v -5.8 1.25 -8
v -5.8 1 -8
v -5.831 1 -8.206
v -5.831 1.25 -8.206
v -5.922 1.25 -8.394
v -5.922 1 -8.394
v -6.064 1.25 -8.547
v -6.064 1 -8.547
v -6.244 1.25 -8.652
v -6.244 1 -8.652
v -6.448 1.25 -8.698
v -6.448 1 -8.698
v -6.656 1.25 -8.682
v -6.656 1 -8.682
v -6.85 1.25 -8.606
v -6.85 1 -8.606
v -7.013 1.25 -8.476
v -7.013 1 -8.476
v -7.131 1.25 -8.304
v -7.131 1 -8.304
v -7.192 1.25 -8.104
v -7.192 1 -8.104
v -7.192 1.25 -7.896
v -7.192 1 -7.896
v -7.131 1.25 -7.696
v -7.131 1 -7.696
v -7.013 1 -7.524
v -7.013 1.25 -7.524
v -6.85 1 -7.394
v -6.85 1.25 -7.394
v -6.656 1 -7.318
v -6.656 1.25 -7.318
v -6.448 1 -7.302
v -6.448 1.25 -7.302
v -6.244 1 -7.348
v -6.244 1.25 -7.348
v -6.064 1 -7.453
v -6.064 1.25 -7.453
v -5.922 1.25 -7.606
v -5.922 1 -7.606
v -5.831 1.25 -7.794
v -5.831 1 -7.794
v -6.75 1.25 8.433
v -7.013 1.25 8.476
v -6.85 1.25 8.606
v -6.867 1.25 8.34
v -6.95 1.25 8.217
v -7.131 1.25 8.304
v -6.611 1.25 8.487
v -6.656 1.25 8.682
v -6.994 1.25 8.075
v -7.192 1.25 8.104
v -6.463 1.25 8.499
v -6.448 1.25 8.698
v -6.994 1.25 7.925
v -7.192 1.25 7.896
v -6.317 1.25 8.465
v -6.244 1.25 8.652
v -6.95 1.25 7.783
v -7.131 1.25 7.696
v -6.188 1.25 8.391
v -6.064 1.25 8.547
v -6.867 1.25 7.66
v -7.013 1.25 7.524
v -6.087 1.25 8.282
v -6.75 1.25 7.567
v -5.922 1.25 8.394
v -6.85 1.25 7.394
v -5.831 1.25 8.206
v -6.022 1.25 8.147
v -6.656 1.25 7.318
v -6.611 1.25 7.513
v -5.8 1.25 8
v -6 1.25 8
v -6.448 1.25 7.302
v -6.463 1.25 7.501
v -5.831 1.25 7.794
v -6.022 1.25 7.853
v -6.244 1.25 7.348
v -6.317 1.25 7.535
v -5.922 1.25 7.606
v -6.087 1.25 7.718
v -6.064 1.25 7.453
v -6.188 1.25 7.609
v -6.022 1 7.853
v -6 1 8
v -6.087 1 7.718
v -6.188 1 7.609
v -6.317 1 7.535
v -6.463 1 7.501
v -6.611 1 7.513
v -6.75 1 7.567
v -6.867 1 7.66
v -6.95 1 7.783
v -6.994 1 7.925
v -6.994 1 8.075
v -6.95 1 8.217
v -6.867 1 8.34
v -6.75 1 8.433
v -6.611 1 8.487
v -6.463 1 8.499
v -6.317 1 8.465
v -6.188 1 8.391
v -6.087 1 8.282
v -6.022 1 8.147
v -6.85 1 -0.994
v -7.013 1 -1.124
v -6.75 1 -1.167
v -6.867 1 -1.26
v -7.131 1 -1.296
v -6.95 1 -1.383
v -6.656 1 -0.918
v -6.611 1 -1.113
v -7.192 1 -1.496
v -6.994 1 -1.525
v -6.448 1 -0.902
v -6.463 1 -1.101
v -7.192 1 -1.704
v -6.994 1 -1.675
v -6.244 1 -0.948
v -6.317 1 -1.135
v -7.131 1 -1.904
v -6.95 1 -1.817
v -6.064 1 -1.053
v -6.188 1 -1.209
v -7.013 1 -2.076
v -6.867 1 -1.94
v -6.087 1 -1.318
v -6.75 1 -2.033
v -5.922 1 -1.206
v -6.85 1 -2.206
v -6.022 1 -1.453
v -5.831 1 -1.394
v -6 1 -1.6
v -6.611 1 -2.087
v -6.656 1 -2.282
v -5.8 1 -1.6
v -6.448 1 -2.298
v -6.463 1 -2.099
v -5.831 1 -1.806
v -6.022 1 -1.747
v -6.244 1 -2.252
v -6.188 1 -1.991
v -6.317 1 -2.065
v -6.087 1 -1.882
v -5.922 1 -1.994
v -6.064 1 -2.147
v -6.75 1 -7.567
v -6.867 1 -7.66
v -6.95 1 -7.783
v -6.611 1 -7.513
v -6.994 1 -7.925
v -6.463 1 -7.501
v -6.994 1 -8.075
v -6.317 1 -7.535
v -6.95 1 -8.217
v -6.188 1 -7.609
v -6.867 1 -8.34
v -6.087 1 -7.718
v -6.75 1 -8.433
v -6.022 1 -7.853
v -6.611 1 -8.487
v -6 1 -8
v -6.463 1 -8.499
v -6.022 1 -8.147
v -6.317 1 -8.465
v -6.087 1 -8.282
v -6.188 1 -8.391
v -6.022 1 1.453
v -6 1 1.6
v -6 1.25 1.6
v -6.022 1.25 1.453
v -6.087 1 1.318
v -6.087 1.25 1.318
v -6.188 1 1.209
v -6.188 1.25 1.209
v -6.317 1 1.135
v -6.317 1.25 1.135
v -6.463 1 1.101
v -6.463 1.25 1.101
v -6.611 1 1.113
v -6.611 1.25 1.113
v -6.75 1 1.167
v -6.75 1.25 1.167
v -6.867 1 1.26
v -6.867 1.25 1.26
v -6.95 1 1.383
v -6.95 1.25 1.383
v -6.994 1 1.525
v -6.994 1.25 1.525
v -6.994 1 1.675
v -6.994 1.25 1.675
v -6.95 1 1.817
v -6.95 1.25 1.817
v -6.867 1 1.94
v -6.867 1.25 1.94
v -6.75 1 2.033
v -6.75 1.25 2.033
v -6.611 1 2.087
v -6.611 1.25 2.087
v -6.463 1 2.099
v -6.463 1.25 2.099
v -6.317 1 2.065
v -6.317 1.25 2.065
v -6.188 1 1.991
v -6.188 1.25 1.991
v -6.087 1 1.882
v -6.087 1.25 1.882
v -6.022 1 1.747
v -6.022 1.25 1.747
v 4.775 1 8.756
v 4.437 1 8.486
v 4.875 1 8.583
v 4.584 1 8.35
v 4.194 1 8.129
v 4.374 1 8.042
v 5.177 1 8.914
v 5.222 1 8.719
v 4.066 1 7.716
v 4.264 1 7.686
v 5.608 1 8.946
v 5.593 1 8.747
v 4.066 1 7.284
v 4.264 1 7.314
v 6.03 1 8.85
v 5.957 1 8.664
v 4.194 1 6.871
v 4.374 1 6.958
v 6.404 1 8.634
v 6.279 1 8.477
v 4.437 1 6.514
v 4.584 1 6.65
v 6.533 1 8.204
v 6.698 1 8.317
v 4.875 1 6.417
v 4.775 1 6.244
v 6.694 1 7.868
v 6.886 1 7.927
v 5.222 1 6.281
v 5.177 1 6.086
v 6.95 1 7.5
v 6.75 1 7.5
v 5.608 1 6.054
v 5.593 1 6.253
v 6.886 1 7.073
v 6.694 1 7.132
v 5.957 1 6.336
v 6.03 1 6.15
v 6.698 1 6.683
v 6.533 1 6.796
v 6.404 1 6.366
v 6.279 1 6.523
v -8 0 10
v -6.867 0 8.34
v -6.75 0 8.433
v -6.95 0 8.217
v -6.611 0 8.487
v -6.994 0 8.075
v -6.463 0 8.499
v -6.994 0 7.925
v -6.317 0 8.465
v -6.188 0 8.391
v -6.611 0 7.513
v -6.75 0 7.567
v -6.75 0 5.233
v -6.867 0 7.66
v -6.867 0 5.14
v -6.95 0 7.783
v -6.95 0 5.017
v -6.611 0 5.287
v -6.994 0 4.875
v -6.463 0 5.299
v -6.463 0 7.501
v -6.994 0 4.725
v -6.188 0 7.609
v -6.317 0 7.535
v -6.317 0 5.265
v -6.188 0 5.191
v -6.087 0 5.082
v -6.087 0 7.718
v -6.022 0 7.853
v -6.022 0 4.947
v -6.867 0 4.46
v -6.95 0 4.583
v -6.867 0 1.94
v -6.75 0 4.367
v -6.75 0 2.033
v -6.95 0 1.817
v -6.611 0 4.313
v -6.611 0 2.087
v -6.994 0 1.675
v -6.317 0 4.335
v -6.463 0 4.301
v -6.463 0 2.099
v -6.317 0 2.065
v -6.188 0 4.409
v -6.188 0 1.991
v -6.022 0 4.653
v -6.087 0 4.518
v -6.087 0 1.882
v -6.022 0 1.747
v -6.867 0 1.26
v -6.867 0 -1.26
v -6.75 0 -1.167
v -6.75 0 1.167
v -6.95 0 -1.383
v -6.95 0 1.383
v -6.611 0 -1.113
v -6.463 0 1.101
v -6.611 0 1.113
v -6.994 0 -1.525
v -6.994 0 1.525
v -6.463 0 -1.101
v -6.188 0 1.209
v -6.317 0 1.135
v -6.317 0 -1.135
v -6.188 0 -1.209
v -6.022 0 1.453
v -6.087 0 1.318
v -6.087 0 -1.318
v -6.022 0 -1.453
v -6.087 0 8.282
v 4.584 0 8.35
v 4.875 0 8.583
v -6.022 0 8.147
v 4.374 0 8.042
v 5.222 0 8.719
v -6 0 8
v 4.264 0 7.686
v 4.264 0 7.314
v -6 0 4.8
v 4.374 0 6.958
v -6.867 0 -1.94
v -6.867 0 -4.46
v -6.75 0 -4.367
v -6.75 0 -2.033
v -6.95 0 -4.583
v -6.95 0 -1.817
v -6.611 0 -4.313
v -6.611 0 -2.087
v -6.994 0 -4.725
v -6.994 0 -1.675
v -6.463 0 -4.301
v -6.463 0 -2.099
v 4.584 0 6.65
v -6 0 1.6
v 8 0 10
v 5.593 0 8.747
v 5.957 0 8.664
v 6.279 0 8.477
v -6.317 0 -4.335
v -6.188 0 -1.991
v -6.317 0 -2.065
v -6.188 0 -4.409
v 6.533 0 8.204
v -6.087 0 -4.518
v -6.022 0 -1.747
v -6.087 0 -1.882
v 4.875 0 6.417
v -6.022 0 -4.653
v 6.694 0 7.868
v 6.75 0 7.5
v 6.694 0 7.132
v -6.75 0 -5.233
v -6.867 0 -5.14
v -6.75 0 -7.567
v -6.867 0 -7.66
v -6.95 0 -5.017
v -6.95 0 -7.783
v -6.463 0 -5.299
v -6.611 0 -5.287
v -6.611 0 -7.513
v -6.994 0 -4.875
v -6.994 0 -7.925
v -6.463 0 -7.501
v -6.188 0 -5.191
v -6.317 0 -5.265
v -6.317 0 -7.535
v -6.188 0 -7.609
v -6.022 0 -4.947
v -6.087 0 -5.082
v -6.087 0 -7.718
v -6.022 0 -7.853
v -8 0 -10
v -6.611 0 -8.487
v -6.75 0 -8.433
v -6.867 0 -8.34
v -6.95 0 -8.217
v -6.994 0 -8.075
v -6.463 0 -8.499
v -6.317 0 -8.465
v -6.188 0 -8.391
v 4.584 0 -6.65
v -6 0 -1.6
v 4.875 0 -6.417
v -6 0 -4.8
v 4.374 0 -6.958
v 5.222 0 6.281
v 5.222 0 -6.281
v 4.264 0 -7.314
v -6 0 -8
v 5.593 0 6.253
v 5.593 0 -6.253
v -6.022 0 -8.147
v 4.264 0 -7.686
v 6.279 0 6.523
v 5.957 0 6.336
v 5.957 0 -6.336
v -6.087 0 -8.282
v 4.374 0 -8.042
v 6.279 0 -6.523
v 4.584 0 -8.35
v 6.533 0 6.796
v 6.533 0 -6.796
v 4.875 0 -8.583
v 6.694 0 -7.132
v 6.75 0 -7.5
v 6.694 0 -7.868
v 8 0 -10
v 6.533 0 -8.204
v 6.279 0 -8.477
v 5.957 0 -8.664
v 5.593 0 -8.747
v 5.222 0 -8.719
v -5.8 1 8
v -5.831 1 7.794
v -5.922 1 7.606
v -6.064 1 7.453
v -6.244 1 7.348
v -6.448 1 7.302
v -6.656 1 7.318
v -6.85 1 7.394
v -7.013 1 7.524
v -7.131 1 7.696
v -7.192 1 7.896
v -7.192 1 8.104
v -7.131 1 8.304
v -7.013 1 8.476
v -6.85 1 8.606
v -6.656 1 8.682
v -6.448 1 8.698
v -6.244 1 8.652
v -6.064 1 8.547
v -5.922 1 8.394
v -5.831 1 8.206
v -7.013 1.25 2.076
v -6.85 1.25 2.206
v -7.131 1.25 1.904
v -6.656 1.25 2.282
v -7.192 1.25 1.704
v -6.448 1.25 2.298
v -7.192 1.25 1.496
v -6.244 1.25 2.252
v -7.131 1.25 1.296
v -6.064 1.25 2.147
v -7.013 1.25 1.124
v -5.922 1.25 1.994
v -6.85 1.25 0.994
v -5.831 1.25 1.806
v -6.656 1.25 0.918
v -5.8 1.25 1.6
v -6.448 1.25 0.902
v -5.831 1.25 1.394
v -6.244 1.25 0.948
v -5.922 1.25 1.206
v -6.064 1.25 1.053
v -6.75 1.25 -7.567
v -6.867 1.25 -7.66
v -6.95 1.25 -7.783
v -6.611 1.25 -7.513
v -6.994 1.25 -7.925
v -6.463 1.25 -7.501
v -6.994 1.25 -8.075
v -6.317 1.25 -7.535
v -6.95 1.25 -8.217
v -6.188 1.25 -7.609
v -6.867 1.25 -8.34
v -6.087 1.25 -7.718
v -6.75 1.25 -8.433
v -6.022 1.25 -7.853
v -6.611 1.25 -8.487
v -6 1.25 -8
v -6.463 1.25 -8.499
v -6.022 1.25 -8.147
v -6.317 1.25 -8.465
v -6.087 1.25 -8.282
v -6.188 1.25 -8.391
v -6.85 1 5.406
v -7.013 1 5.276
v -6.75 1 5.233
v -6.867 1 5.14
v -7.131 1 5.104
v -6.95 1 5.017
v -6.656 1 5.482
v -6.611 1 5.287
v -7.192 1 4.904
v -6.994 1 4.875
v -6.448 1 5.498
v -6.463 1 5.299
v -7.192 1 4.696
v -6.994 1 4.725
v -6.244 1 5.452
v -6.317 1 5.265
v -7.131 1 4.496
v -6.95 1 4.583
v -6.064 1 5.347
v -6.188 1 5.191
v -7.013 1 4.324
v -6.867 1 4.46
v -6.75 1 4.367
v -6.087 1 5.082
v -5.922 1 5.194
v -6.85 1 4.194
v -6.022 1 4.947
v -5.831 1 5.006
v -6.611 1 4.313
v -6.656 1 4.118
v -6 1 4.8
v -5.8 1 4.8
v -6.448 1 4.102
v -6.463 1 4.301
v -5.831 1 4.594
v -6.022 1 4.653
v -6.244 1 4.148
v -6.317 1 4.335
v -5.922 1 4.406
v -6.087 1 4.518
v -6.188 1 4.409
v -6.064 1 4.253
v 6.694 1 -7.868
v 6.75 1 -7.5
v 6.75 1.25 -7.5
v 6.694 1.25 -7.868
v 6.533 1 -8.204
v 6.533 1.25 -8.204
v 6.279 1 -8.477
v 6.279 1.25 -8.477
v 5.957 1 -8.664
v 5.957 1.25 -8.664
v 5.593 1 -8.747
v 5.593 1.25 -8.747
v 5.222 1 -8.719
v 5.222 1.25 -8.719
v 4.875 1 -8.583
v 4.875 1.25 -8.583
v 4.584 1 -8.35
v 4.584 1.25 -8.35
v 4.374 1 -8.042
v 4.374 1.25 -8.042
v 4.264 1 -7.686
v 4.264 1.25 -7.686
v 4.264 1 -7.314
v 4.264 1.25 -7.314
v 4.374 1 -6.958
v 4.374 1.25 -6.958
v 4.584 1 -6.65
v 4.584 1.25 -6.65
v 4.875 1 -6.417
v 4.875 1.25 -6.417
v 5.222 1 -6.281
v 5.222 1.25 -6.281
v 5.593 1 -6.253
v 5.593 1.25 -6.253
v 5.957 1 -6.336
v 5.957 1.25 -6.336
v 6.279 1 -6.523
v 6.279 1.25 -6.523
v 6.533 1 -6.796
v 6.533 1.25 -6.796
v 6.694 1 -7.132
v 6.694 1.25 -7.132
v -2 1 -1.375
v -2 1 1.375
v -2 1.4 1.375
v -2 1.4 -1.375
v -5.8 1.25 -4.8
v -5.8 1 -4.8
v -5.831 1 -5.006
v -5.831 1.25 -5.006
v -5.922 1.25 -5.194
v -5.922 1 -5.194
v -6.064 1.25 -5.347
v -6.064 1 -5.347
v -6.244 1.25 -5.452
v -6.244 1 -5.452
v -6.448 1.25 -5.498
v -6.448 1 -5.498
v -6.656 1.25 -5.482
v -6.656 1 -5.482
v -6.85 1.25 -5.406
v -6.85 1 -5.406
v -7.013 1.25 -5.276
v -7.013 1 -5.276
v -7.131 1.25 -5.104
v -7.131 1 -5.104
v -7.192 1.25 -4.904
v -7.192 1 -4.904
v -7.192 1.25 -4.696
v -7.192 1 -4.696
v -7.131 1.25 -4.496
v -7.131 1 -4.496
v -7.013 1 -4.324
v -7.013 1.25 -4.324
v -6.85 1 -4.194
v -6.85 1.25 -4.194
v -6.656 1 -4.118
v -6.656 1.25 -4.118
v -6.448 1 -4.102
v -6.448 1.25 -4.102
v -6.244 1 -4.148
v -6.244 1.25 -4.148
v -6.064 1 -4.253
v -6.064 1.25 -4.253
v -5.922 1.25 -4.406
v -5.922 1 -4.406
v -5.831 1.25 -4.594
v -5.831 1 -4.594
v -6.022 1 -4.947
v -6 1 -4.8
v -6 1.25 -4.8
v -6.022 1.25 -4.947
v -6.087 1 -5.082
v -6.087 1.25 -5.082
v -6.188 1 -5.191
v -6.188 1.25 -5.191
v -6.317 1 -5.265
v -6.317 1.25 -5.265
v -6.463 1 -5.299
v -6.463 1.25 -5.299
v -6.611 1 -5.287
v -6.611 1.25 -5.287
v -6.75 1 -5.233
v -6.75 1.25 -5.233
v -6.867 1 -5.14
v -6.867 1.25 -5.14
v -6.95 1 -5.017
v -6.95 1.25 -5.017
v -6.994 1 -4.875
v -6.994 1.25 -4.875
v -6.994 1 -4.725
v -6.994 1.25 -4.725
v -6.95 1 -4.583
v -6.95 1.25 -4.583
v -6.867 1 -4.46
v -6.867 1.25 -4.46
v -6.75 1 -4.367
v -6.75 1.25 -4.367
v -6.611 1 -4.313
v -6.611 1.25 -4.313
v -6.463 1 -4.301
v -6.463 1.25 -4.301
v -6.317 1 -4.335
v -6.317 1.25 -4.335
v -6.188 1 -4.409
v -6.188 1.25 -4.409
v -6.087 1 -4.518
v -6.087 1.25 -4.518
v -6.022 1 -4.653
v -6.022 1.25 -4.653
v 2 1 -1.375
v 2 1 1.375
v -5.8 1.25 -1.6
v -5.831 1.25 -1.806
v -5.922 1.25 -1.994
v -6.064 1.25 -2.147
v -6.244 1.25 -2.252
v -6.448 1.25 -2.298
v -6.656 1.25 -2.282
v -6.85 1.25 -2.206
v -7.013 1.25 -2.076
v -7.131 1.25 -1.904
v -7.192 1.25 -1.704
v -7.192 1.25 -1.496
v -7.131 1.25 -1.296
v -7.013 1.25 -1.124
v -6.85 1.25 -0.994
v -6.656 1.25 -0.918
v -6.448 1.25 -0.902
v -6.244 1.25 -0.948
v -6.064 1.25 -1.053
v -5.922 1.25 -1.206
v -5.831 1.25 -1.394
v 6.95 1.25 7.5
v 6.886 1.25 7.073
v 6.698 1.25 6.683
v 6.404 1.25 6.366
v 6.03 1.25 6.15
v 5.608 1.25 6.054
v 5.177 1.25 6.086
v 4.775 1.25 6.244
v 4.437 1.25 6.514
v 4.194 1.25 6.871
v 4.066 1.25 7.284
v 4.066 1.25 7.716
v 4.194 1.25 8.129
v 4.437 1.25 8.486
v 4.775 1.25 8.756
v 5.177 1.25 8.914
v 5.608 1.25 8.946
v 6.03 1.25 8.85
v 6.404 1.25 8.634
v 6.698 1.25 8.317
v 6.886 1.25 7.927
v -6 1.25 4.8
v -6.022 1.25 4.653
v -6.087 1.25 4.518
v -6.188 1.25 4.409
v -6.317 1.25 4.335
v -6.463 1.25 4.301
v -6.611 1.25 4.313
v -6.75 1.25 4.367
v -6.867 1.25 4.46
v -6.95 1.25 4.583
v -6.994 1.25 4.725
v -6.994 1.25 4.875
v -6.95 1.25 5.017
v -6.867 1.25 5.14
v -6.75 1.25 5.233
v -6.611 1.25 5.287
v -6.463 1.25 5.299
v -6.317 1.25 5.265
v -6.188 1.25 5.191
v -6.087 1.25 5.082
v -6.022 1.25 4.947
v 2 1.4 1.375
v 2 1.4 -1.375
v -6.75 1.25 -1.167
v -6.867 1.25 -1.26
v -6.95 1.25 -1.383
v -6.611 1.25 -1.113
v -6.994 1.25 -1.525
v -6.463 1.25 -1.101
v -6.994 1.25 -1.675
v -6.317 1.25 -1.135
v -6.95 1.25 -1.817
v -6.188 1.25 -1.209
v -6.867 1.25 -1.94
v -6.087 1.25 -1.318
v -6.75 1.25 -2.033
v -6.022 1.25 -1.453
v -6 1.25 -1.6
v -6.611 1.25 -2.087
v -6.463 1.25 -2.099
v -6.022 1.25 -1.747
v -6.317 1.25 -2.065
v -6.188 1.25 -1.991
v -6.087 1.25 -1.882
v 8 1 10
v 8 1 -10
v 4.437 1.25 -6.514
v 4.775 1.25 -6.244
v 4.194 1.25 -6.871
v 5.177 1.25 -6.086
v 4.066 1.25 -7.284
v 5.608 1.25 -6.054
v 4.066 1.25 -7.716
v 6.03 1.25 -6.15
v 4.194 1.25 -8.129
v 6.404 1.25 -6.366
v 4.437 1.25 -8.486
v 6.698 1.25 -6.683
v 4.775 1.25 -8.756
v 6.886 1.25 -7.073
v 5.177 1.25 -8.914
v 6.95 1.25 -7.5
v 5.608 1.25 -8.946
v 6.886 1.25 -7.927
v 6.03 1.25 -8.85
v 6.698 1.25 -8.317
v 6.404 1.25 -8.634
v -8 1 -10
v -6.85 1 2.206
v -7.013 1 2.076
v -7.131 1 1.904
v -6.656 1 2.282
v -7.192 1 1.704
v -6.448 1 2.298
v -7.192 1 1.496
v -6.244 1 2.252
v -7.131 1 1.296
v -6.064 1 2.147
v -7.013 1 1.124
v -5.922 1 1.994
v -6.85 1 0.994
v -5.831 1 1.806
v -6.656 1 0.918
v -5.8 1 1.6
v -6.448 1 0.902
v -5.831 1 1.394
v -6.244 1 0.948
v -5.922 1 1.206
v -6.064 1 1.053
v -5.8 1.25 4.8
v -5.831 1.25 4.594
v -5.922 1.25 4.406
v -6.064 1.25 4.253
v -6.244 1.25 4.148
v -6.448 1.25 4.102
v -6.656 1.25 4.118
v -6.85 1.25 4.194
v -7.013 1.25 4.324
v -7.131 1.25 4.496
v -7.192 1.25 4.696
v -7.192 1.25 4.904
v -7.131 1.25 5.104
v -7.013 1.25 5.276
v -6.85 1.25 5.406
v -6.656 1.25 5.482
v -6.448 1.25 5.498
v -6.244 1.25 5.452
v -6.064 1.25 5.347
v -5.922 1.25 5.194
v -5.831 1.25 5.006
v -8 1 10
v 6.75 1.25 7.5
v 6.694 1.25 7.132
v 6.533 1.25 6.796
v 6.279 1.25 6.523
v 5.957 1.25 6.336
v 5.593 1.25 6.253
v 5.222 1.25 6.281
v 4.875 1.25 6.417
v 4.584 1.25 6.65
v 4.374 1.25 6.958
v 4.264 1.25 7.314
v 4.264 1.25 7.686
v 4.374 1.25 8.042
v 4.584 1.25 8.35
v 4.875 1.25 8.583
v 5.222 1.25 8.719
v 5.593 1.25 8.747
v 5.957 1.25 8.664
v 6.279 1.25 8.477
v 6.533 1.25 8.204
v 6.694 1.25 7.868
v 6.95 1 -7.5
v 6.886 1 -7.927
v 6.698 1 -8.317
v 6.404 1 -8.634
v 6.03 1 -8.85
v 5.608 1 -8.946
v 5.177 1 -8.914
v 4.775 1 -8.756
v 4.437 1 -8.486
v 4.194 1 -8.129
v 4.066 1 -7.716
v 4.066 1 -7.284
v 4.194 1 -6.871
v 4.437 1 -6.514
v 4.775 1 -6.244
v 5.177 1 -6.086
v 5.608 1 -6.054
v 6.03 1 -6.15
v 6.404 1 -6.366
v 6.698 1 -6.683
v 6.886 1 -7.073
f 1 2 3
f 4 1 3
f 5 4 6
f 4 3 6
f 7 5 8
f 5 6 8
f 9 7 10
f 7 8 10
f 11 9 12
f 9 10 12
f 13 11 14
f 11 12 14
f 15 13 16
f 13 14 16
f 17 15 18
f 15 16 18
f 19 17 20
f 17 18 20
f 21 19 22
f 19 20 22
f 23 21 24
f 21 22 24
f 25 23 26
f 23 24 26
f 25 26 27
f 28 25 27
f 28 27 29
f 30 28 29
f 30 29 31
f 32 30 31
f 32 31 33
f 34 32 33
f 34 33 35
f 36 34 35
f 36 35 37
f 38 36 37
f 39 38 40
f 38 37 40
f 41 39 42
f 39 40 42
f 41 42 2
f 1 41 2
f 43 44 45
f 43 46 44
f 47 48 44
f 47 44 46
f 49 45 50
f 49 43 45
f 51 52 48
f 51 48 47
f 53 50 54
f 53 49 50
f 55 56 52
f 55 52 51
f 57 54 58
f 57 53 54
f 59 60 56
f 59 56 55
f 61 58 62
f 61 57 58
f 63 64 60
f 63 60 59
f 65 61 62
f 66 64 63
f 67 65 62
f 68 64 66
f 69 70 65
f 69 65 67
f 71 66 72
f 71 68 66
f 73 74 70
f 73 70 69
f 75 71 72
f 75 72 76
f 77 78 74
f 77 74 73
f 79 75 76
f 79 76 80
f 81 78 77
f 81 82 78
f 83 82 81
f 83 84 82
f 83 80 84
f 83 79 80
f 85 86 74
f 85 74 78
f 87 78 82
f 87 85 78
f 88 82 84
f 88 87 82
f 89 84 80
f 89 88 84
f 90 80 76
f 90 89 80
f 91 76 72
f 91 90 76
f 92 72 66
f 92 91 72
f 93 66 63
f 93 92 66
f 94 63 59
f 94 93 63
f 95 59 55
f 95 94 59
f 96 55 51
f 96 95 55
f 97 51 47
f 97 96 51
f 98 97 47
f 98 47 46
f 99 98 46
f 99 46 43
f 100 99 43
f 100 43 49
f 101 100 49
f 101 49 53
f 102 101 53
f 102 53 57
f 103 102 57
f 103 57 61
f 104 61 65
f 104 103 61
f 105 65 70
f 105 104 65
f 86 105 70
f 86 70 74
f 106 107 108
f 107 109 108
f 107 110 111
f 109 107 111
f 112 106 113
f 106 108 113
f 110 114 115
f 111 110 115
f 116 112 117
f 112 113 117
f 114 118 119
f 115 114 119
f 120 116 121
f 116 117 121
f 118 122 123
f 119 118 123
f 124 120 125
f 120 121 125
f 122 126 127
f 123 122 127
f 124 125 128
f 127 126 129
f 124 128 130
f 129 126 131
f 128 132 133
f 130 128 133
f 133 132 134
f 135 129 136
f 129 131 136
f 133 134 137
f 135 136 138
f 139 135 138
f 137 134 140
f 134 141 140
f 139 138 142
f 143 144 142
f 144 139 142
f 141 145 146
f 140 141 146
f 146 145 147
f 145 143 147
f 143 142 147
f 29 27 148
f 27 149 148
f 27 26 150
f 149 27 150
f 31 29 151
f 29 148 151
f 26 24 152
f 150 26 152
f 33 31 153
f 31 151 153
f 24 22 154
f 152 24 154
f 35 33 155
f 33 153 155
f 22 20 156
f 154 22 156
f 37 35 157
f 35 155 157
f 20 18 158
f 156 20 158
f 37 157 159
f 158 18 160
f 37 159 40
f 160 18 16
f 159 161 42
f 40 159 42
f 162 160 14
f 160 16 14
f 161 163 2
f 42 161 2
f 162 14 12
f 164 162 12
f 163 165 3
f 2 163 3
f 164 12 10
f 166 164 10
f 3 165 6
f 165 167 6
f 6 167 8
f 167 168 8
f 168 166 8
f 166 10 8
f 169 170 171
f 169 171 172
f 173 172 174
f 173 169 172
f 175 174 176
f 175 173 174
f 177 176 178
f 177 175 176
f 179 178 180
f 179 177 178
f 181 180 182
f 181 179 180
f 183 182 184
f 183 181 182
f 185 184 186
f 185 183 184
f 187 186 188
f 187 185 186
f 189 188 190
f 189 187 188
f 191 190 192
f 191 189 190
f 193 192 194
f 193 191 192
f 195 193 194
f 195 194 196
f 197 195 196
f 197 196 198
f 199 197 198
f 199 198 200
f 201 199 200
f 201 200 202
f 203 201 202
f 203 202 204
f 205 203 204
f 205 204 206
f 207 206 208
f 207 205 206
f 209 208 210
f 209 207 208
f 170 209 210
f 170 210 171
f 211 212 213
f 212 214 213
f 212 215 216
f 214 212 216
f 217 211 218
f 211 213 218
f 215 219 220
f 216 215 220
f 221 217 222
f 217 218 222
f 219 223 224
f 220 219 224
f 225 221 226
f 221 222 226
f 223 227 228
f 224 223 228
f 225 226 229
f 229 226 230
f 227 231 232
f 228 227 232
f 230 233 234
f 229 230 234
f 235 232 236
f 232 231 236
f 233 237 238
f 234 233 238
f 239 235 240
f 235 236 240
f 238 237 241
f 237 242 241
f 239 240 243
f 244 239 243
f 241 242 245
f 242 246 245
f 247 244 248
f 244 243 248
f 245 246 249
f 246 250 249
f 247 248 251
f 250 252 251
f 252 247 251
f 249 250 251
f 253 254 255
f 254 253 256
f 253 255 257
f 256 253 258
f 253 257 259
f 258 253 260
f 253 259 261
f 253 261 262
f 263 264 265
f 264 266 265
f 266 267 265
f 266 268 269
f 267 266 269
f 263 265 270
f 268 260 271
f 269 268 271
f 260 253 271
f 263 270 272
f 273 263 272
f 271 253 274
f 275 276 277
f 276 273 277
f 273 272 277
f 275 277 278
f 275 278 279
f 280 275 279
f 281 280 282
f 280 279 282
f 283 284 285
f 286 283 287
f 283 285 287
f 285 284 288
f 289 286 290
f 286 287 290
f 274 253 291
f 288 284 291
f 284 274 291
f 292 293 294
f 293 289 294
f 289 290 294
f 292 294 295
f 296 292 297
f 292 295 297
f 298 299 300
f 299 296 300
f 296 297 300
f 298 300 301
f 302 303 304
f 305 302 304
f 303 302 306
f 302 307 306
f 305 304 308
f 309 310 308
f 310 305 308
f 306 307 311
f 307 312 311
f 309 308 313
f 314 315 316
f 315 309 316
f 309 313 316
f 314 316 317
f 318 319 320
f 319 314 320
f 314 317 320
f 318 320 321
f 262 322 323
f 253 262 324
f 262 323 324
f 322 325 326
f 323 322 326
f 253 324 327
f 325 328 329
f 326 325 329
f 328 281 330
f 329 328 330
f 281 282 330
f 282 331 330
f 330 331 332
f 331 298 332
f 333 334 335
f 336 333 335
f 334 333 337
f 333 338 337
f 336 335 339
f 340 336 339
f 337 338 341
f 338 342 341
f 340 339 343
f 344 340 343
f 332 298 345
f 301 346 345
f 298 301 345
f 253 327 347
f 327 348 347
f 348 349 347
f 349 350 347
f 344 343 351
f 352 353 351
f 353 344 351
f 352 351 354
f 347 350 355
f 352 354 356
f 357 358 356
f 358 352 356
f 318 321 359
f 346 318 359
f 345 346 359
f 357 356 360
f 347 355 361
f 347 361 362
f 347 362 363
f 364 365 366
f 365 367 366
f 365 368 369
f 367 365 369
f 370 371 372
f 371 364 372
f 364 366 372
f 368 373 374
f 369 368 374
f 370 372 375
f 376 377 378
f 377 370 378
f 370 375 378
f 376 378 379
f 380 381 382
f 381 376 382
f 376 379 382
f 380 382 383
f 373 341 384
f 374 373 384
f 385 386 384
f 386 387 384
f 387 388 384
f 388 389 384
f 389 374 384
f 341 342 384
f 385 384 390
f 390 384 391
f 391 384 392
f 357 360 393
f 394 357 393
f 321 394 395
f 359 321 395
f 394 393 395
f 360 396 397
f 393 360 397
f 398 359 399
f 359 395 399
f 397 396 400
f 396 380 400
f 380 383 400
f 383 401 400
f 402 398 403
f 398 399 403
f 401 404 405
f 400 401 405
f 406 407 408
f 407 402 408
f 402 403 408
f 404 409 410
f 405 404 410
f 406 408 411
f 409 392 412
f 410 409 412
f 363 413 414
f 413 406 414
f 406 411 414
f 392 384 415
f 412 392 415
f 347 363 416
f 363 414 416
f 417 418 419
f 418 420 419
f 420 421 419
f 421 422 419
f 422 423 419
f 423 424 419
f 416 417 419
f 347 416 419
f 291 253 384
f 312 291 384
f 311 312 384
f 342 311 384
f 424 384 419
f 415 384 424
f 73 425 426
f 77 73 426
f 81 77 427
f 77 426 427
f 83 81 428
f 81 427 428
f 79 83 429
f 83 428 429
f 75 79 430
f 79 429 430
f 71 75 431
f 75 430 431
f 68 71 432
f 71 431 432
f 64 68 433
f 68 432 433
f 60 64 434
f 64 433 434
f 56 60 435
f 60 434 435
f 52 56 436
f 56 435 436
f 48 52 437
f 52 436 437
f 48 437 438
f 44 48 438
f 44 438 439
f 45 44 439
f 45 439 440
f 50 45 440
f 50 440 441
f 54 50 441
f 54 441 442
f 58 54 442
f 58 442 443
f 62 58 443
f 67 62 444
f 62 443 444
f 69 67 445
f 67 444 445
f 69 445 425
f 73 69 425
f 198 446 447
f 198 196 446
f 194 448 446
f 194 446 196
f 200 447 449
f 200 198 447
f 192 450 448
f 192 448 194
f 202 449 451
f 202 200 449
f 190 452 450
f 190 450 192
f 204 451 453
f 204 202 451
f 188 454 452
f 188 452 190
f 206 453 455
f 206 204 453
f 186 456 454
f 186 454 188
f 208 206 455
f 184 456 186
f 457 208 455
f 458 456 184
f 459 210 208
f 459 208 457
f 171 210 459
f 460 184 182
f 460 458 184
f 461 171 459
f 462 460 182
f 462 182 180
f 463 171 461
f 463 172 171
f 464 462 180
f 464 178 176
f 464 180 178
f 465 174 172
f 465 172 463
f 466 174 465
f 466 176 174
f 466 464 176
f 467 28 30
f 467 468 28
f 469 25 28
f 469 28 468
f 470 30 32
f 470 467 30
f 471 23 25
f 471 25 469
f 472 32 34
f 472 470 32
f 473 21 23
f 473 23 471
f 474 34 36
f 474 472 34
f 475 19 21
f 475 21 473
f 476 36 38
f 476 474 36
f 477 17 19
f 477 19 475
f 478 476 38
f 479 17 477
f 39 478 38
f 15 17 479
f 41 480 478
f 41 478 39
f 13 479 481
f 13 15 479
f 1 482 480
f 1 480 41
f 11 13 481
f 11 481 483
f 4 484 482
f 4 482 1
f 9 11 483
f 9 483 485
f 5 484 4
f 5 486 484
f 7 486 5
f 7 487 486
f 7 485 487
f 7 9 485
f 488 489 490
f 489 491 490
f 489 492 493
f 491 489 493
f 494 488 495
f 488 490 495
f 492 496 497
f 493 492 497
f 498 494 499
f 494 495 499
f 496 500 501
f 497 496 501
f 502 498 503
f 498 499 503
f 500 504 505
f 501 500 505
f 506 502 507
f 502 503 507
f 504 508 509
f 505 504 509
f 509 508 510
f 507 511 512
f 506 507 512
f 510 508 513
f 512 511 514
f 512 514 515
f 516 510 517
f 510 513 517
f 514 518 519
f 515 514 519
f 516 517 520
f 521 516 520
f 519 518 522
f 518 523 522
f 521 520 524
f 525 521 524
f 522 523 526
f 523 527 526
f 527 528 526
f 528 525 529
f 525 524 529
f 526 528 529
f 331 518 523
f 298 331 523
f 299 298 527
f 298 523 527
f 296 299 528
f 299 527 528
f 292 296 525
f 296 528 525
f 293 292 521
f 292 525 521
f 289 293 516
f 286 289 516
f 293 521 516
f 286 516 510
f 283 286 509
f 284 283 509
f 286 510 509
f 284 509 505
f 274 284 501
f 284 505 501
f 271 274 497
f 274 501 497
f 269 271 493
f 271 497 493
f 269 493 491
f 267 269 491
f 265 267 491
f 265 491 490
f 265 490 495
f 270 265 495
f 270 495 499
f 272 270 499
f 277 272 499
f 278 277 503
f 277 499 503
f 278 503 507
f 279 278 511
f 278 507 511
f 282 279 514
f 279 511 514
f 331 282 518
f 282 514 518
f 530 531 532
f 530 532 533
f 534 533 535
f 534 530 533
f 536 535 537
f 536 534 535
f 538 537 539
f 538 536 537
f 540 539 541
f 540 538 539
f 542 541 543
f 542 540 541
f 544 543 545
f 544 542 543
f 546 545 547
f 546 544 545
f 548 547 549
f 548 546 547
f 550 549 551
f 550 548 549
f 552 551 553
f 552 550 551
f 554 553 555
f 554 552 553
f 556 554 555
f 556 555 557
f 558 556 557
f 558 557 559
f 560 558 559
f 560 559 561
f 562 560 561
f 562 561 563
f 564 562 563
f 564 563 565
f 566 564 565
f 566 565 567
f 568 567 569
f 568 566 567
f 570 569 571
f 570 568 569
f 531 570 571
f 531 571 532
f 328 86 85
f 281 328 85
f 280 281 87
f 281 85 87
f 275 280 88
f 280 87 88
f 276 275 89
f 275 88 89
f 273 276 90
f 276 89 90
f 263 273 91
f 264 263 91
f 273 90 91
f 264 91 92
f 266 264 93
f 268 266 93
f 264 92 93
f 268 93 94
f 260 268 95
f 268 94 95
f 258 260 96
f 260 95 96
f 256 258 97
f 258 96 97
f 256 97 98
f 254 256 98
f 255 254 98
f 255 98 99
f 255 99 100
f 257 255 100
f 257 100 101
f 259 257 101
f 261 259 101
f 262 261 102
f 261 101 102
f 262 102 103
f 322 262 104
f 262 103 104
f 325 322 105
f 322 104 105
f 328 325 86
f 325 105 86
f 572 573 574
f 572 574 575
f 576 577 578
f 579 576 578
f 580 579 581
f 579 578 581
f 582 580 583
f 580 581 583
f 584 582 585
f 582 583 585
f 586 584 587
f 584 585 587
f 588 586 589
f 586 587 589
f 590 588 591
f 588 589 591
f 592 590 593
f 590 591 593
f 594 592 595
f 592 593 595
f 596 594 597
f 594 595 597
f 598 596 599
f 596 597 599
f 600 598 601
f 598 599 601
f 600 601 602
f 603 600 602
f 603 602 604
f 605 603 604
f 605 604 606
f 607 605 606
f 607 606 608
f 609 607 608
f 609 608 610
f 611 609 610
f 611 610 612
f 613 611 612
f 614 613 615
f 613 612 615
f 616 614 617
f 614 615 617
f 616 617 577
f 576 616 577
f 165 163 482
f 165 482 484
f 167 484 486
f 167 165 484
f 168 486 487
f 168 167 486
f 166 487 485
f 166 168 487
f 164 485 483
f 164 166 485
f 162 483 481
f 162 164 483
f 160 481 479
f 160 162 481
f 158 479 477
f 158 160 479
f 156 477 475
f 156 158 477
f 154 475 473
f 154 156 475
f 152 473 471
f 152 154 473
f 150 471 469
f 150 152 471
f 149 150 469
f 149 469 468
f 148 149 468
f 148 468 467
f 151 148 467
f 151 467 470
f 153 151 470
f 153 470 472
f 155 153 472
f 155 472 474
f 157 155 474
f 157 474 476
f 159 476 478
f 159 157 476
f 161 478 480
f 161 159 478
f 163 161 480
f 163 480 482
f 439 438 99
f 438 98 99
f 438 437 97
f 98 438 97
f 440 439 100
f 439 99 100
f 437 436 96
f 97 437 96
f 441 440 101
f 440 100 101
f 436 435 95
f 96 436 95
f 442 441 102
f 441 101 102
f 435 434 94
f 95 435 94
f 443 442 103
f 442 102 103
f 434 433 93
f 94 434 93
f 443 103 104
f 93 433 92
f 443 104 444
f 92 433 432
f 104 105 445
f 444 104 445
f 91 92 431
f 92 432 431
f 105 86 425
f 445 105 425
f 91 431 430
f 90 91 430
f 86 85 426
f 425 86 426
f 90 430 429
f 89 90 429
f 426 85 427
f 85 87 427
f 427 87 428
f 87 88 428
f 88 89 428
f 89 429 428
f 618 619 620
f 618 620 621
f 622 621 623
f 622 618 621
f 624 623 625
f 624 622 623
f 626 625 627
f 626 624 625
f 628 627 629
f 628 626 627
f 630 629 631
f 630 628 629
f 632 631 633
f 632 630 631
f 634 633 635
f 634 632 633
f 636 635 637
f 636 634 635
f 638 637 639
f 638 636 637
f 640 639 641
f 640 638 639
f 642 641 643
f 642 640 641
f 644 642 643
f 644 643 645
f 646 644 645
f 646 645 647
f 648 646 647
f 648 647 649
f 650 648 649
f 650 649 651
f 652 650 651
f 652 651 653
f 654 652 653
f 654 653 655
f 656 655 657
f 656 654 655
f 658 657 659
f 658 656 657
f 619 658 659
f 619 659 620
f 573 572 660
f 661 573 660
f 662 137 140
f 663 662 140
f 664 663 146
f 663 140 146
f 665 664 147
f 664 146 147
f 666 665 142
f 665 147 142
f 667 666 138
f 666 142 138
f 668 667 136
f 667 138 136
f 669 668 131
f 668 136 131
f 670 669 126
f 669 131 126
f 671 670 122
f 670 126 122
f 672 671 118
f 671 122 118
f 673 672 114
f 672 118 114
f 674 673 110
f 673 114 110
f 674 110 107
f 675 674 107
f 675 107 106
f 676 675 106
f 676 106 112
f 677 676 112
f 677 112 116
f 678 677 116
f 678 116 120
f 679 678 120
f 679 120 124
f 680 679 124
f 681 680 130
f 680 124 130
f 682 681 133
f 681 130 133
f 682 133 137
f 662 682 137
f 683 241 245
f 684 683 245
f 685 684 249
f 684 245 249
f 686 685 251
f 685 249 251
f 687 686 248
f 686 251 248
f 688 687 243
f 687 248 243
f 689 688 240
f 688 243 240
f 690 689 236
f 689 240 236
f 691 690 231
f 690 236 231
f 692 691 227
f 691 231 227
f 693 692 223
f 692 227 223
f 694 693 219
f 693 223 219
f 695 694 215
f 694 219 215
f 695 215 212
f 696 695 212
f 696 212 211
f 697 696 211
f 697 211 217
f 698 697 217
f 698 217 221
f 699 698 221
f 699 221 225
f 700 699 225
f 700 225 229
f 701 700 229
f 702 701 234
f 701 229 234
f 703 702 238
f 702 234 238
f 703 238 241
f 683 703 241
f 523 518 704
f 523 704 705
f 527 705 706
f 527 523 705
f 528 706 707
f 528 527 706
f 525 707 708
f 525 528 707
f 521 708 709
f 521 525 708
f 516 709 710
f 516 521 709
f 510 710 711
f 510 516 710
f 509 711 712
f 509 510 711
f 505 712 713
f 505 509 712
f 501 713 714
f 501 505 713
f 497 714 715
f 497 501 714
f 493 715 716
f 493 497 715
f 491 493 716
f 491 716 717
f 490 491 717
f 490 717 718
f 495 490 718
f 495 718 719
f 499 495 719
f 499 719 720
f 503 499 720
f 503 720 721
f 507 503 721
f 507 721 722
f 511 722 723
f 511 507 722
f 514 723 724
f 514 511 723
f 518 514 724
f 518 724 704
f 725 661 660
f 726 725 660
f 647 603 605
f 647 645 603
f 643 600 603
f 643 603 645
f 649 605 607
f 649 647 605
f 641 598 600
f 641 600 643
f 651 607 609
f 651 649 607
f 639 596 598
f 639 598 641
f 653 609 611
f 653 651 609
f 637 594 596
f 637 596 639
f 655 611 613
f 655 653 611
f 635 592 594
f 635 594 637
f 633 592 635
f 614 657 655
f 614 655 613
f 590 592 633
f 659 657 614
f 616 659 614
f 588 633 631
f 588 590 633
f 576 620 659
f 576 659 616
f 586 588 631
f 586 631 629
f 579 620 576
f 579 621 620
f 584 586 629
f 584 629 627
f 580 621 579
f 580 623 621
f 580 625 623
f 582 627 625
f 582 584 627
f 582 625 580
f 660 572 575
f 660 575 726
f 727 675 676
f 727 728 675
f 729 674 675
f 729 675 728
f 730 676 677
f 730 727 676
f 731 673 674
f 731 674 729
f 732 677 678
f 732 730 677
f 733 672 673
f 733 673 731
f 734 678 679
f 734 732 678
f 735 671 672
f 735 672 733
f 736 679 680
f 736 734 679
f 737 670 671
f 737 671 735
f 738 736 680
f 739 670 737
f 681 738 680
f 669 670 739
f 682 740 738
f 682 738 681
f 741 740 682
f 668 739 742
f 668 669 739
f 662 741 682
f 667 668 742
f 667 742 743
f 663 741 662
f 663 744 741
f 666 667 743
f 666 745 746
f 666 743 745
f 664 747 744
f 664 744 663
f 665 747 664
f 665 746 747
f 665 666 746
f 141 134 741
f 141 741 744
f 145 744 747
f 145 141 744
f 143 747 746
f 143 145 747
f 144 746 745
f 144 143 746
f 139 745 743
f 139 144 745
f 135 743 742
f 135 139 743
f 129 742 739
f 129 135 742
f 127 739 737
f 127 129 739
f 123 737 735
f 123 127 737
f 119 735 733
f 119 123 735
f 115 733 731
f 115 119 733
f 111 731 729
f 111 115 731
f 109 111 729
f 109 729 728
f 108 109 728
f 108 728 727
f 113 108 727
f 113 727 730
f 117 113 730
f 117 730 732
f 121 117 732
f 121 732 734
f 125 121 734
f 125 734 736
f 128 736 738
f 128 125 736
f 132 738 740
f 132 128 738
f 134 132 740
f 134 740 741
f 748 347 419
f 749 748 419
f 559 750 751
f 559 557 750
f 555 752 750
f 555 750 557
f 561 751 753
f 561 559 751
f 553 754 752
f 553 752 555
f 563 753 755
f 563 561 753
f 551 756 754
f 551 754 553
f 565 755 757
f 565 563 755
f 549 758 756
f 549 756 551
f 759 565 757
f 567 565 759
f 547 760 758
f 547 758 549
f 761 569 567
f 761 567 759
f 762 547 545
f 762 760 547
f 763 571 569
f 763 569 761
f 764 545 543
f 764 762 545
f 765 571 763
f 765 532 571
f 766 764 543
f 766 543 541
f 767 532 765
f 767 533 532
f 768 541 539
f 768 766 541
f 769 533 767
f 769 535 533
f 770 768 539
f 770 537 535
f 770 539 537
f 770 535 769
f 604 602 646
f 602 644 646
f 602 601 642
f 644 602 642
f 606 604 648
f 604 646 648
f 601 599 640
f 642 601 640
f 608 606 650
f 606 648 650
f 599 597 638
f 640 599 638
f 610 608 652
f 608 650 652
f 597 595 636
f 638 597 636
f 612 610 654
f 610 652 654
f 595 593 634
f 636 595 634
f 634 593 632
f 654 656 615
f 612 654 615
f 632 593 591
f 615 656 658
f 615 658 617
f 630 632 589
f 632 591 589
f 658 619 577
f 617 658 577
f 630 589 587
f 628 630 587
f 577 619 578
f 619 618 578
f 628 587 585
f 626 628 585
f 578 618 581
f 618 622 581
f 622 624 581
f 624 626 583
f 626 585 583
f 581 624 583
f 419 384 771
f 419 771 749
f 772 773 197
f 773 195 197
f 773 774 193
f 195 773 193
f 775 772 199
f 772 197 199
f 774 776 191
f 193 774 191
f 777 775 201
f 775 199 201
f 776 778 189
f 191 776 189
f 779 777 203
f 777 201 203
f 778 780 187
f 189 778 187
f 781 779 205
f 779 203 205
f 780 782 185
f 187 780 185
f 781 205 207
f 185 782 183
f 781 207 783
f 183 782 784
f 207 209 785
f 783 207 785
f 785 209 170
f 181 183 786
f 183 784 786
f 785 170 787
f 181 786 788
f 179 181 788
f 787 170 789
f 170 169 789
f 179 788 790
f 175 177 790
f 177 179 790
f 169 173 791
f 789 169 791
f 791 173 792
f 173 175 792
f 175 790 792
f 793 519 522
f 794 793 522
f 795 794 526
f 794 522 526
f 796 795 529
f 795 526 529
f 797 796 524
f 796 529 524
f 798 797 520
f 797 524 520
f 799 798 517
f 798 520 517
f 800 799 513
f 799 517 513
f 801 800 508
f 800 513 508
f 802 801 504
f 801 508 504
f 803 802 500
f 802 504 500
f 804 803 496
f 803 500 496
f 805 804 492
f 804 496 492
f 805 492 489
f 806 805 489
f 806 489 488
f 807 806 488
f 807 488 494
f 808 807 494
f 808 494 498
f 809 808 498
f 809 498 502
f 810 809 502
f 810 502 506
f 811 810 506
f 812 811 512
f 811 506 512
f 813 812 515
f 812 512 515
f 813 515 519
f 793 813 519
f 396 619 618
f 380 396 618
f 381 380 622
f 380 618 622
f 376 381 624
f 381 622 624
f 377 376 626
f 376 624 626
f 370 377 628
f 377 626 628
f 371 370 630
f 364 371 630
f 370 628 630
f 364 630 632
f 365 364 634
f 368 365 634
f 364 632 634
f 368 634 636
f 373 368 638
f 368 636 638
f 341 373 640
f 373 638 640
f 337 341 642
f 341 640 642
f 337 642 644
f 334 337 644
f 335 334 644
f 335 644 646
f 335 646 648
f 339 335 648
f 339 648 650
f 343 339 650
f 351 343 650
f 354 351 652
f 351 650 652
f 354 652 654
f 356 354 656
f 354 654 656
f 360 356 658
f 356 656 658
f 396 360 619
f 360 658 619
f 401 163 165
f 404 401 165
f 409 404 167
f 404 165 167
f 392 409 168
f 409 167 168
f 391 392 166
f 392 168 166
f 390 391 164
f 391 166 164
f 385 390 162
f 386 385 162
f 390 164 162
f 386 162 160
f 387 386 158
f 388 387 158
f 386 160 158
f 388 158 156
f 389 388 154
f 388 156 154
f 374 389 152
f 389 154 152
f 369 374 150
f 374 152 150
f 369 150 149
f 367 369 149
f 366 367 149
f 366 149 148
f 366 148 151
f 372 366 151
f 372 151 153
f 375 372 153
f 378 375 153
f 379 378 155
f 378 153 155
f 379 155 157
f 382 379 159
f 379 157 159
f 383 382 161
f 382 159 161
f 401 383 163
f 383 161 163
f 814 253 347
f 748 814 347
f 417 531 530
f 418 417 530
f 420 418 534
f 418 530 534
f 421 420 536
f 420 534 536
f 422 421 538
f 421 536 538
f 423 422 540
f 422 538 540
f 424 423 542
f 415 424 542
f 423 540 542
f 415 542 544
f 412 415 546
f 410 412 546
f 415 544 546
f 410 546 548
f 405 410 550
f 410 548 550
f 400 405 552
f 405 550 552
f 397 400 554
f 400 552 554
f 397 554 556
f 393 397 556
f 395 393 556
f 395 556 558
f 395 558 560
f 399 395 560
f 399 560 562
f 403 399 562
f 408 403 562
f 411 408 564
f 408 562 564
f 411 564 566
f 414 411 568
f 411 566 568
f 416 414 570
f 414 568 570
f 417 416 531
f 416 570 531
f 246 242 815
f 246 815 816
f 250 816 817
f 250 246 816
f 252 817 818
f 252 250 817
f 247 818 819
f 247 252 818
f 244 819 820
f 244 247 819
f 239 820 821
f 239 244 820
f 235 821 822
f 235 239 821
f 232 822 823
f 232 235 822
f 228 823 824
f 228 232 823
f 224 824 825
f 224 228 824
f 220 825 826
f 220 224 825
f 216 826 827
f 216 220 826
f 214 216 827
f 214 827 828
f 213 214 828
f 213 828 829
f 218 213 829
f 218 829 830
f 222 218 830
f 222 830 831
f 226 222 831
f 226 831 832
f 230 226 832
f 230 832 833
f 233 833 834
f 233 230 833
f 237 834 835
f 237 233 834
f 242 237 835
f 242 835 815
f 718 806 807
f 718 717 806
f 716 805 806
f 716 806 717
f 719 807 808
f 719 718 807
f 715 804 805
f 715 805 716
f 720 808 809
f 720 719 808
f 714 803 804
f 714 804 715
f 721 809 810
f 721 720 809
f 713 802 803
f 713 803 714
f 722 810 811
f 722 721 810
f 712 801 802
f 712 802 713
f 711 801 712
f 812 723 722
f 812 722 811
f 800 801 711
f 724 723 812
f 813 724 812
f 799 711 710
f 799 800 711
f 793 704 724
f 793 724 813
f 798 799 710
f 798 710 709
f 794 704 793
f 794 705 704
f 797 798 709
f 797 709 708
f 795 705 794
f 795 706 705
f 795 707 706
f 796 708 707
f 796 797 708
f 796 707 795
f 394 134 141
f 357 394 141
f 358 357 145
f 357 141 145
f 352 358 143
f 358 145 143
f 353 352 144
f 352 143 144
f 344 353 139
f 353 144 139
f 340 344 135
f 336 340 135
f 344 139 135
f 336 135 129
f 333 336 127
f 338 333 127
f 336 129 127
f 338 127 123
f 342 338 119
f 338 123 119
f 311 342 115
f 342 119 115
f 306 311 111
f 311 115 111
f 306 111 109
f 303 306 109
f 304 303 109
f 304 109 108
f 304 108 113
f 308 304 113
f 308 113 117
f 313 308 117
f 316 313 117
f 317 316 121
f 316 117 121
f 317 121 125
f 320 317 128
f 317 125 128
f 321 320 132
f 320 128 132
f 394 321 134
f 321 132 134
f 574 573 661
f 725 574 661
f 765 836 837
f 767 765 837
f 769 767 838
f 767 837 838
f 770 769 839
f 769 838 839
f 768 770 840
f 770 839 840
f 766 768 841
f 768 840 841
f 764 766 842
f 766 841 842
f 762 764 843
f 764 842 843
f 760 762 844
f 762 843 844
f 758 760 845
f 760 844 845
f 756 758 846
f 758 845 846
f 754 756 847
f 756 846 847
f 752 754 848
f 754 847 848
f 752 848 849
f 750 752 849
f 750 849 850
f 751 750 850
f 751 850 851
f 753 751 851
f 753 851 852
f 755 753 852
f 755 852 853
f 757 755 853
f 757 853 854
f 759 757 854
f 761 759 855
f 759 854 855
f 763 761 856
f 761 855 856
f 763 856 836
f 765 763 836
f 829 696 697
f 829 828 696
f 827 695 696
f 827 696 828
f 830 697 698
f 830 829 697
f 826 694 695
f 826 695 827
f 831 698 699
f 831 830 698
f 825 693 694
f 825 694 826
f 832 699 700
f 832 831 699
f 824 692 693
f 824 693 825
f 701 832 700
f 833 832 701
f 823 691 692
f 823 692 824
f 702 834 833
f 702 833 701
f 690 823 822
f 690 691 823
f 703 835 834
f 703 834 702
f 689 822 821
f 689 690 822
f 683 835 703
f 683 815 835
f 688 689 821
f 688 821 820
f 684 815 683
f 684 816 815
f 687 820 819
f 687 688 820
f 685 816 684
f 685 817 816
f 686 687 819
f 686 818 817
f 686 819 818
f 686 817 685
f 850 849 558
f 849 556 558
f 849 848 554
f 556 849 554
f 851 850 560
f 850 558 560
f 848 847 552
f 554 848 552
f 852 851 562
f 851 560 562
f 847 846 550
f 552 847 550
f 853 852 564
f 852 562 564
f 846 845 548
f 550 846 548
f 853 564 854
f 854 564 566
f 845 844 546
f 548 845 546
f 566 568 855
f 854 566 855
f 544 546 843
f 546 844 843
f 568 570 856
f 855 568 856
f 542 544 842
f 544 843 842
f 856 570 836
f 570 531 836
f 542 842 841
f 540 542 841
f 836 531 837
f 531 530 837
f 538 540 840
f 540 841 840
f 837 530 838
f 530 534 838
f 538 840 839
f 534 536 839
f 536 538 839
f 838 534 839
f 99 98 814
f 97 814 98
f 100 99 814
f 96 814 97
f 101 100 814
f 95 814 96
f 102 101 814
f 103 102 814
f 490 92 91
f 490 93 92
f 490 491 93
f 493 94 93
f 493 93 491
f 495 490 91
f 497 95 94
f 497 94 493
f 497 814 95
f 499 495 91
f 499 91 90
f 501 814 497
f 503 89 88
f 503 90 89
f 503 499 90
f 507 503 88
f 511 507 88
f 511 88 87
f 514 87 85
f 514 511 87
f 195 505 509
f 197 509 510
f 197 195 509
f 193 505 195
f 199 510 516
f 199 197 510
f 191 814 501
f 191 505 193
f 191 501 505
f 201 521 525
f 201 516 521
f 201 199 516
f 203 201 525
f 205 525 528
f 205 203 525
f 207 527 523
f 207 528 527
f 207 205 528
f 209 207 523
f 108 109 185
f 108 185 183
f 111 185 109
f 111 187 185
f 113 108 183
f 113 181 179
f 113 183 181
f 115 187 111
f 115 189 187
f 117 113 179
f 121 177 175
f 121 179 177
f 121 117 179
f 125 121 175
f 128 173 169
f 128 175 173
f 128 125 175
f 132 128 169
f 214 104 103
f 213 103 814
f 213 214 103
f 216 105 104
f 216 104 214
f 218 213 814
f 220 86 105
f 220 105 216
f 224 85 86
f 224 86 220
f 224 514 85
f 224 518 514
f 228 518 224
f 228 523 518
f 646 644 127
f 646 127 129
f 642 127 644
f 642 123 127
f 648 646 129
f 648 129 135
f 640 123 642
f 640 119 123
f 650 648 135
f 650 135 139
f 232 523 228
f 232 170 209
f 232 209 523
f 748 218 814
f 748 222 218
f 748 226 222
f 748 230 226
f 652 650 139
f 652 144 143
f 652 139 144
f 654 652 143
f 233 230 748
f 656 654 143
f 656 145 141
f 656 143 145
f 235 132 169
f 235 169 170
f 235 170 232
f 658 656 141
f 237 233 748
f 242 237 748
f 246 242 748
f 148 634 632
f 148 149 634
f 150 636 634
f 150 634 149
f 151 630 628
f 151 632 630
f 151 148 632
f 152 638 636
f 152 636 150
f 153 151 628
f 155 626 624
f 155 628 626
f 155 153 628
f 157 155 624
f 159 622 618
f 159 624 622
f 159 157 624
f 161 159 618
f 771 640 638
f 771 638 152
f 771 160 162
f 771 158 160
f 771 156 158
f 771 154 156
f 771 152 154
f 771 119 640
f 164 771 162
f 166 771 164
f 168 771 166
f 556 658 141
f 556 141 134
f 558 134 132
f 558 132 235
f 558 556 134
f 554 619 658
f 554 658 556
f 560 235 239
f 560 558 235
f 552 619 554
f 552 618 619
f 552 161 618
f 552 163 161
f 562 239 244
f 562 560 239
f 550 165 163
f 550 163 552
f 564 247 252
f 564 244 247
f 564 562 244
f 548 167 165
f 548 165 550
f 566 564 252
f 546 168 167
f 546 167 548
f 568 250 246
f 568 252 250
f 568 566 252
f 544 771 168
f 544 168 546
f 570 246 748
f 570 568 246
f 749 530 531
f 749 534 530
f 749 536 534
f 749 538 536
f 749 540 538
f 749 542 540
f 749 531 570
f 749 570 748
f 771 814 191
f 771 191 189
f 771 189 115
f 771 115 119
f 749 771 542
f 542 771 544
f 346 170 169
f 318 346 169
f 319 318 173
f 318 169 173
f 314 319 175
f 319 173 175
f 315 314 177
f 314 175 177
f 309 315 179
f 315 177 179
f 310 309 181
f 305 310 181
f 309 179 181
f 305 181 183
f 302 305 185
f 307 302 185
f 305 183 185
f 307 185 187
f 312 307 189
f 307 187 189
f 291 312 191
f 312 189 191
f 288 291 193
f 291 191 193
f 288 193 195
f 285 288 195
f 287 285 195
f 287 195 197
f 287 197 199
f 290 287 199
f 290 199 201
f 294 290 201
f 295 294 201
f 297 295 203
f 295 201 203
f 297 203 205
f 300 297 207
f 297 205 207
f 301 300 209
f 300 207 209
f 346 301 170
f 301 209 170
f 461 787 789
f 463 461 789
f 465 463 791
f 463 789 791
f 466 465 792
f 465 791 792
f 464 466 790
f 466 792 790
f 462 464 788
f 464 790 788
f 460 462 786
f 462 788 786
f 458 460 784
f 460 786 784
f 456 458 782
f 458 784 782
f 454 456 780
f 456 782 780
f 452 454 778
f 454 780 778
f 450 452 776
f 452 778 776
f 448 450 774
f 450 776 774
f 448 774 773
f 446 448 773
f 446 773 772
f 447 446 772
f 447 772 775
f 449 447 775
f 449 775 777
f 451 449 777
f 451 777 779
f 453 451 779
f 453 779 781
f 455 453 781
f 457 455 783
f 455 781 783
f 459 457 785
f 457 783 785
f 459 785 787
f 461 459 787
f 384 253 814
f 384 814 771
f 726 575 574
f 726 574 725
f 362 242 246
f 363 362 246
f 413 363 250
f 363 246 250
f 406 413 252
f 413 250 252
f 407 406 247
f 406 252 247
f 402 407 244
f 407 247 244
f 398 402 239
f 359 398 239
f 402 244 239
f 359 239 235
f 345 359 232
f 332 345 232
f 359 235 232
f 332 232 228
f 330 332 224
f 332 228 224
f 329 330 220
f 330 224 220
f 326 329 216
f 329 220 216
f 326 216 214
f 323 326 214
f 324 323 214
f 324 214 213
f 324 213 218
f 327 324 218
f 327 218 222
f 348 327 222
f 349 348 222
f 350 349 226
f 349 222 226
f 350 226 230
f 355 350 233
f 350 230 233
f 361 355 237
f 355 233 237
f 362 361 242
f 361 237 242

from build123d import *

# Parameters (mm, degrees)
SKETCH1_W             = 16
SKETCH1_H             = 20
BOSS_EXTRUDE1_DEPTH   = 1
SKETCH2_R             = 0.5
SKETCH2_R_2           = 1.25
CUT_EXTRUDE1_DEPTH    = 1
SKETCH3_R             = 1.45
SKETCH3_R_2           = 1.25
BOSS_EXTRUDE2_DEPTH   = 0.25
BOSS_EXTRUDE2_2_DEPTH = 0.25
SKETCH3_R_3           = 0.7
SKETCH3_R_4           = 0.5
BOSS_EXTRUDE2_3_DEPTH = 0.25
BOSS_EXTRUDE2_4_DEPTH = 0.25
BOSS_EXTRUDE2_5_DEPTH = 0.25
BOSS_EXTRUDE2_6_DEPTH = 0.25
BOSS_EXTRUDE2_7_DEPTH = 0.25
BOSS_EXTRUDE2_8_DEPTH = 0.25
SKETCH4_W             = 4
SKETCH4_H             = 2.75
BOSS_EXTRUDE3_DEPTH   = 0.4


with BuildPart() as part:
    # Sketch1 → Boss-Extrude1 (new body)
    with BuildSketch(Plane(origin=(0, 0, 0), x_dir=(1, 0, 0), z_dir=(0, 1, 0))):
        Rectangle(SKETCH1_W, SKETCH1_H)
    extrude(amount=BOSS_EXTRUDE1_DEPTH)

    # Sketch2 → Cut-Extrude1 (cut)
    with BuildSketch(Plane(origin=(0, 1, 0), x_dir=(1, 0, 0), z_dir=(0, 1, 0))):
        with Locations((-6.5, 8)):
            Circle(SKETCH2_R)
        with Locations((-6.5, 4.8)):
            Circle(SKETCH2_R)
        with Locations((-6.5, 1.6)):
            Circle(SKETCH2_R)
        with Locations((-6.5, -1.6)):
            Circle(SKETCH2_R)
        with Locations((-6.5, -4.8)):
            Circle(SKETCH2_R)
        with Locations((-6.5, -8)):
            Circle(SKETCH2_R)
        with Locations((5.5, 7.5)):
            Circle(SKETCH2_R_2)
        with Locations((5.5, -7.5)):
            Circle(SKETCH2_R_2)
    extrude(amount=-CUT_EXTRUDE1_DEPTH, mode=Mode.SUBTRACT)


with BuildPart() as body_2:
    # Sketch3 → Boss-Extrude2 (new body)
    with BuildSketch(Plane(origin=(0, 1, 0), x_dir=(1, 0, 0), z_dir=(0, 1, 0))):
        with Locations((5.5, -7.5)):
            Circle(SKETCH3_R)
        with Locations((5.5, -7.5)):
            Circle(SKETCH3_R_2, mode=Mode.SUBTRACT)
    extrude(amount=BOSS_EXTRUDE2_DEPTH)


with BuildPart() as body_3:
    # Sketch3 → Boss-Extrude2 2 (new body)
    with BuildSketch(Plane(origin=(0, 1, 0), x_dir=(1, 0, 0), z_dir=(0, 1, 0))):
        with Locations((5.5, 7.5)):
            Circle(SKETCH3_R)
        with Locations((5.5, 7.5)):
            Circle(SKETCH3_R_2, mode=Mode.SUBTRACT)
    extrude(amount=BOSS_EXTRUDE2_2_DEPTH)


with BuildPart() as body_4:
    # Sketch3 → Boss-Extrude2 3 (new body)
    with BuildSketch(Plane(origin=(0, 1, 0), x_dir=(1, 0, 0), z_dir=(0, 1, 0))):
        with Locations((-6.5, -8)):
            Circle(SKETCH3_R_3)
        with Locations((-6.5, -8)):
            Circle(SKETCH3_R_4, mode=Mode.SUBTRACT)
    extrude(amount=BOSS_EXTRUDE2_3_DEPTH)


with BuildPart() as body_5:
    # Sketch3 → Boss-Extrude2 4 (new body)
    with BuildSketch(Plane(origin=(0, 1, 0), x_dir=(1, 0, 0), z_dir=(0, 1, 0))):
        with Locations((-6.5, -4.8)):
            Circle(SKETCH3_R_3)
        with Locations((-6.5, -4.8)):
            Circle(SKETCH3_R_4, mode=Mode.SUBTRACT)
    extrude(amount=BOSS_EXTRUDE2_4_DEPTH)


with BuildPart() as body_6:
    # Sketch3 → Boss-Extrude2 5 (new body)
    with BuildSketch(Plane(origin=(0, 1, 0), x_dir=(1, 0, 0), z_dir=(0, 1, 0))):
        with Locations((-6.5, -1.6)):
            Circle(SKETCH3_R_3)
        with Locations((-6.5, -1.6)):
            Circle(SKETCH3_R_4, mode=Mode.SUBTRACT)
    extrude(amount=BOSS_EXTRUDE2_5_DEPTH)


with BuildPart() as body_7:
    # Sketch3 → Boss-Extrude2 6 (new body)
    with BuildSketch(Plane(origin=(0, 1, 0), x_dir=(1, 0, 0), z_dir=(0, 1, 0))):
        with Locations((-6.5, 1.6)):
            Circle(SKETCH3_R_3)
        with Locations((-6.5, 1.6)):
            Circle(SKETCH3_R_4, mode=Mode.SUBTRACT)
    extrude(amount=BOSS_EXTRUDE2_6_DEPTH)


with BuildPart() as body_8:
    # Sketch3 → Boss-Extrude2 7 (new body)
    with BuildSketch(Plane(origin=(0, 1, 0), x_dir=(1, 0, 0), z_dir=(0, 1, 0))):
        with Locations((-6.5, 4.8)):
            Circle(SKETCH3_R_3)
        with Locations((-6.5, 4.8)):
            Circle(SKETCH3_R_4, mode=Mode.SUBTRACT)
    extrude(amount=BOSS_EXTRUDE2_7_DEPTH)


with BuildPart() as body_9:
    # Sketch3 → Boss-Extrude2 8 (new body)
    with BuildSketch(Plane(origin=(0, 1, 0), x_dir=(1, 0, 0), z_dir=(0, 1, 0))):
        with Locations((-6.5, 8)):
            Circle(SKETCH3_R_3)
        with Locations((-6.5, 8)):
            Circle(SKETCH3_R_4, mode=Mode.SUBTRACT)
    extrude(amount=BOSS_EXTRUDE2_8_DEPTH)


with BuildPart() as body_10:
    # Sketch4 → Boss-Extrude3 (new body)
    with BuildSketch(Plane(origin=(0, 1, 0), x_dir=(1, 0, 0), z_dir=(0, 1, 0))):
        Rectangle(SKETCH4_W, SKETCH4_H)
    extrude(amount=BOSS_EXTRUDE3_DEPTH)


solid = Compound([part.part, body_2.part, body_3.part, body_4.part, body_5.part, body_6.part, body_7.part, body_8.part, body_9.part, body_10.part])
